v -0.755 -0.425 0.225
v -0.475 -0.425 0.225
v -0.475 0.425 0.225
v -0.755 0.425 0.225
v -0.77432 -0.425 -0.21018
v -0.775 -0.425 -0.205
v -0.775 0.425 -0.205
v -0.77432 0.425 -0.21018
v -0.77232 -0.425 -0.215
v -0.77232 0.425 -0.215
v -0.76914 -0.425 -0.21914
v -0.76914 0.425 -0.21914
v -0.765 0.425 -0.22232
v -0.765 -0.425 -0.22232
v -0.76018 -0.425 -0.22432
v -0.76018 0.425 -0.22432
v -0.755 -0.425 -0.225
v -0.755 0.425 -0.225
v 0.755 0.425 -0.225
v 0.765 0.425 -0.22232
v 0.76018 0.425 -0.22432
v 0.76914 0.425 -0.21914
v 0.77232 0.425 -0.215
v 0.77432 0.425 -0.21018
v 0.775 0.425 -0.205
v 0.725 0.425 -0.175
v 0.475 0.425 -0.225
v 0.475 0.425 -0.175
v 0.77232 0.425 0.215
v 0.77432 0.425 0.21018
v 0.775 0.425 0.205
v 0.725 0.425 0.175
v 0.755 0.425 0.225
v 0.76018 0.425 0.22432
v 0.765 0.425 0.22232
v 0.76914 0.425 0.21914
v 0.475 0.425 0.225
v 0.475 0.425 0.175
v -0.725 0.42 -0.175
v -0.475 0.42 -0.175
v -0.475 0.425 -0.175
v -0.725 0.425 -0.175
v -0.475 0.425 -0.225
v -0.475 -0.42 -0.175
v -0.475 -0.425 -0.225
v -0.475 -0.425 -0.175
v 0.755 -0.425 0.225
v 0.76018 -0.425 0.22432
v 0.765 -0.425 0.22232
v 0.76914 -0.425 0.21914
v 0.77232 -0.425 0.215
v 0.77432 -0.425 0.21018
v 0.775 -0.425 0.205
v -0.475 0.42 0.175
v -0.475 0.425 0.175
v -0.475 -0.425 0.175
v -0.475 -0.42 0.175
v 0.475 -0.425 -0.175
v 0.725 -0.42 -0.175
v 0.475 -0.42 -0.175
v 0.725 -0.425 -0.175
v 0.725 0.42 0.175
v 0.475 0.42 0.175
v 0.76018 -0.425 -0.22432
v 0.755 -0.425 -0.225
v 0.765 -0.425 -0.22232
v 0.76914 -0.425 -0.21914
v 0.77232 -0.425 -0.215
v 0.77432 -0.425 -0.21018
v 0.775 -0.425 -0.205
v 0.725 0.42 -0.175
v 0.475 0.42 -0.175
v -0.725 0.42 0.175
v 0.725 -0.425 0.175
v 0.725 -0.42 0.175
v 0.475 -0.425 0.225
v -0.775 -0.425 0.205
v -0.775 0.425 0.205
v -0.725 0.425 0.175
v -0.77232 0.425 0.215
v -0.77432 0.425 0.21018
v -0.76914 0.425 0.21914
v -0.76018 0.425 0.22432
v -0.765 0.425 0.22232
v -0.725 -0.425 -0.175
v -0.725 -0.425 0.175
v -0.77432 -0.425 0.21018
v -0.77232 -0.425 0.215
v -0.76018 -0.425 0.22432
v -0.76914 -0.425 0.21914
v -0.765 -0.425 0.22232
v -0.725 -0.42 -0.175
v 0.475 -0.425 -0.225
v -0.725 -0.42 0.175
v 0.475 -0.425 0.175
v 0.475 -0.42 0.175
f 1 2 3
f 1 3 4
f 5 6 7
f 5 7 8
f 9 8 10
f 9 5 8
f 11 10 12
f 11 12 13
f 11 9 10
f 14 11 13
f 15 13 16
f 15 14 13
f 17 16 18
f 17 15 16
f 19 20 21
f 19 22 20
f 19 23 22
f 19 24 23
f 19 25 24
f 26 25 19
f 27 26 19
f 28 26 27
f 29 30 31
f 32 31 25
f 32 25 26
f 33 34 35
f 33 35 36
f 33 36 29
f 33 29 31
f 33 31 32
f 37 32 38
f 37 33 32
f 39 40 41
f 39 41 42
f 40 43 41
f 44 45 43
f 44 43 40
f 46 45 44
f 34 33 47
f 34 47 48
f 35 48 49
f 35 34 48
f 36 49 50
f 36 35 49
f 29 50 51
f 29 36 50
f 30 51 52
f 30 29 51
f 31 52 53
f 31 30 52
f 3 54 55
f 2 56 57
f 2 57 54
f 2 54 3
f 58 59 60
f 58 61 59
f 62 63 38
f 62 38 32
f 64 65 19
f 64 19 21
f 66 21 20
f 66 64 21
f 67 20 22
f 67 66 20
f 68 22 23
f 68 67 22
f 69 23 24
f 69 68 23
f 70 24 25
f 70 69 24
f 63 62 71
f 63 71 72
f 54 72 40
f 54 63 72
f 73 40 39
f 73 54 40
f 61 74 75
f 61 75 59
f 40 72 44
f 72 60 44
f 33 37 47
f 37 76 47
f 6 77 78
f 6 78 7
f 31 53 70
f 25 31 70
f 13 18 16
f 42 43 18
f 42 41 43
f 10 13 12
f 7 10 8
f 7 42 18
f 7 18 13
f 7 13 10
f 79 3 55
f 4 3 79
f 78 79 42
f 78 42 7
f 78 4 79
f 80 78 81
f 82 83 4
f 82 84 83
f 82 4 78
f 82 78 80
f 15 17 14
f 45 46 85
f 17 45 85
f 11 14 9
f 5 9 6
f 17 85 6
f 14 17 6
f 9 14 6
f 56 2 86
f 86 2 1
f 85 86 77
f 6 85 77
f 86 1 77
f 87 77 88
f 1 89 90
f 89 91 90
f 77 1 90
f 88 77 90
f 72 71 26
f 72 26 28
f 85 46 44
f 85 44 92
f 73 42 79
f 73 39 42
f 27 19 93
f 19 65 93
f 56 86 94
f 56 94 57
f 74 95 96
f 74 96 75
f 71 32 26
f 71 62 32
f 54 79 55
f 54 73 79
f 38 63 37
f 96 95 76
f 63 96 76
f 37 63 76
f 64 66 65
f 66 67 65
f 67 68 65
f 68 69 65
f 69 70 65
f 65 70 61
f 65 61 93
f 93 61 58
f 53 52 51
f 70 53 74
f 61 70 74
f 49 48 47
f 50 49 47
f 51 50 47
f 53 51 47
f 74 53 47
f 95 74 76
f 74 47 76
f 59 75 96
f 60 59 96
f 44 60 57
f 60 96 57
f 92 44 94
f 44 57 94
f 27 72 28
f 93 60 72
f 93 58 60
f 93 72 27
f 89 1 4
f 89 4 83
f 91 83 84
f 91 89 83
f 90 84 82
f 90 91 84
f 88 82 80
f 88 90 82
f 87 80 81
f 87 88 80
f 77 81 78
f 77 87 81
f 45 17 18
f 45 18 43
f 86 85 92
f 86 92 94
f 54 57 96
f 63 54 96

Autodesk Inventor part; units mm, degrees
ref_plane "YZ Plane" through (0, 0, 0) normal (1, 0, 0) x (0, 1, 0)
ref_plane "XZ Plane" through (0, 0, 0) normal (0, 1, 0) x (-1, 0, 0)
ref_plane "XY Plane" through (0, 0, 0) normal (0, 0, 1) x (1, 0, 0)
sketch "Sketch1" plane through (0, 0, 0) normal (0, 1, 0) x (-1, 0, 0)
  line L0 (0.725, 0.175) -> (-0.725, 0.175)
  line L1 (-0.725, 0.175) -> (-0.725, -0.175)
  line L2 (-0.725, -0.175) -> (0.725, -0.175)
  line L3 (0.725, -0.175) -> (0.725, 0.175)
  line L4 (0.475, 0.175) -> (0.475, 0.225)
  line L5 (0.475, 0.225) -> (0.775, 0.225)
  line L6 (0.775, 0.225) -> (0.775, -0.225)
  line L7 (0.775, -0.225) -> (0.475, -0.225)
  line L8 (0.475, -0.225) -> (0.475, -0.175)
  line L9 (-0.475, 0.175) -> (-0.475, 0.225)
  line L10 (-0.475, 0.225) -> (-0.775, 0.225)
  line L11 (-0.775, 0.225) -> (-0.775, -0.225)
  line L12 (-0.775, -0.225) -> (-0.475, -0.225)
  line L13 (-0.475, -0.175) -> (-0.475, -0.225)
  line L14 (0.475, 0.175) -> (-0.475, 0.175)
  point P0 (0, 0)
  point P1 (0, 0.175)
  point P2 (0.725, 0)
  dimension "d0" = 1.55
  dimension "d1" = 0.05
  dimension "d2" = 0.05
  dimension "d3" = 0.45
  dimension "d4" = 0.3
extrude "Extrusion1" add sketch "Sketch1" along normal mid plane 0.85 contours L0 L4 L5 L6 L7 L8 L2 L3 | L0 L1 L2 L13 L12 L11 L10 L9
extrude "Extrusion2" add sketch "Sketch1" along normal mid plane 0.84 contours L3 L2 L1 L0
fillet "Fillet1" radius 0.02 4 edges at (-0.775, 0, 0.225) (-0.775, 0, -0.225) (0.775, 0, 0.225) (0.775, 0, -0.225)
equation "\"d2\" = d1"
properties part number "21-1001" material "Copper"
